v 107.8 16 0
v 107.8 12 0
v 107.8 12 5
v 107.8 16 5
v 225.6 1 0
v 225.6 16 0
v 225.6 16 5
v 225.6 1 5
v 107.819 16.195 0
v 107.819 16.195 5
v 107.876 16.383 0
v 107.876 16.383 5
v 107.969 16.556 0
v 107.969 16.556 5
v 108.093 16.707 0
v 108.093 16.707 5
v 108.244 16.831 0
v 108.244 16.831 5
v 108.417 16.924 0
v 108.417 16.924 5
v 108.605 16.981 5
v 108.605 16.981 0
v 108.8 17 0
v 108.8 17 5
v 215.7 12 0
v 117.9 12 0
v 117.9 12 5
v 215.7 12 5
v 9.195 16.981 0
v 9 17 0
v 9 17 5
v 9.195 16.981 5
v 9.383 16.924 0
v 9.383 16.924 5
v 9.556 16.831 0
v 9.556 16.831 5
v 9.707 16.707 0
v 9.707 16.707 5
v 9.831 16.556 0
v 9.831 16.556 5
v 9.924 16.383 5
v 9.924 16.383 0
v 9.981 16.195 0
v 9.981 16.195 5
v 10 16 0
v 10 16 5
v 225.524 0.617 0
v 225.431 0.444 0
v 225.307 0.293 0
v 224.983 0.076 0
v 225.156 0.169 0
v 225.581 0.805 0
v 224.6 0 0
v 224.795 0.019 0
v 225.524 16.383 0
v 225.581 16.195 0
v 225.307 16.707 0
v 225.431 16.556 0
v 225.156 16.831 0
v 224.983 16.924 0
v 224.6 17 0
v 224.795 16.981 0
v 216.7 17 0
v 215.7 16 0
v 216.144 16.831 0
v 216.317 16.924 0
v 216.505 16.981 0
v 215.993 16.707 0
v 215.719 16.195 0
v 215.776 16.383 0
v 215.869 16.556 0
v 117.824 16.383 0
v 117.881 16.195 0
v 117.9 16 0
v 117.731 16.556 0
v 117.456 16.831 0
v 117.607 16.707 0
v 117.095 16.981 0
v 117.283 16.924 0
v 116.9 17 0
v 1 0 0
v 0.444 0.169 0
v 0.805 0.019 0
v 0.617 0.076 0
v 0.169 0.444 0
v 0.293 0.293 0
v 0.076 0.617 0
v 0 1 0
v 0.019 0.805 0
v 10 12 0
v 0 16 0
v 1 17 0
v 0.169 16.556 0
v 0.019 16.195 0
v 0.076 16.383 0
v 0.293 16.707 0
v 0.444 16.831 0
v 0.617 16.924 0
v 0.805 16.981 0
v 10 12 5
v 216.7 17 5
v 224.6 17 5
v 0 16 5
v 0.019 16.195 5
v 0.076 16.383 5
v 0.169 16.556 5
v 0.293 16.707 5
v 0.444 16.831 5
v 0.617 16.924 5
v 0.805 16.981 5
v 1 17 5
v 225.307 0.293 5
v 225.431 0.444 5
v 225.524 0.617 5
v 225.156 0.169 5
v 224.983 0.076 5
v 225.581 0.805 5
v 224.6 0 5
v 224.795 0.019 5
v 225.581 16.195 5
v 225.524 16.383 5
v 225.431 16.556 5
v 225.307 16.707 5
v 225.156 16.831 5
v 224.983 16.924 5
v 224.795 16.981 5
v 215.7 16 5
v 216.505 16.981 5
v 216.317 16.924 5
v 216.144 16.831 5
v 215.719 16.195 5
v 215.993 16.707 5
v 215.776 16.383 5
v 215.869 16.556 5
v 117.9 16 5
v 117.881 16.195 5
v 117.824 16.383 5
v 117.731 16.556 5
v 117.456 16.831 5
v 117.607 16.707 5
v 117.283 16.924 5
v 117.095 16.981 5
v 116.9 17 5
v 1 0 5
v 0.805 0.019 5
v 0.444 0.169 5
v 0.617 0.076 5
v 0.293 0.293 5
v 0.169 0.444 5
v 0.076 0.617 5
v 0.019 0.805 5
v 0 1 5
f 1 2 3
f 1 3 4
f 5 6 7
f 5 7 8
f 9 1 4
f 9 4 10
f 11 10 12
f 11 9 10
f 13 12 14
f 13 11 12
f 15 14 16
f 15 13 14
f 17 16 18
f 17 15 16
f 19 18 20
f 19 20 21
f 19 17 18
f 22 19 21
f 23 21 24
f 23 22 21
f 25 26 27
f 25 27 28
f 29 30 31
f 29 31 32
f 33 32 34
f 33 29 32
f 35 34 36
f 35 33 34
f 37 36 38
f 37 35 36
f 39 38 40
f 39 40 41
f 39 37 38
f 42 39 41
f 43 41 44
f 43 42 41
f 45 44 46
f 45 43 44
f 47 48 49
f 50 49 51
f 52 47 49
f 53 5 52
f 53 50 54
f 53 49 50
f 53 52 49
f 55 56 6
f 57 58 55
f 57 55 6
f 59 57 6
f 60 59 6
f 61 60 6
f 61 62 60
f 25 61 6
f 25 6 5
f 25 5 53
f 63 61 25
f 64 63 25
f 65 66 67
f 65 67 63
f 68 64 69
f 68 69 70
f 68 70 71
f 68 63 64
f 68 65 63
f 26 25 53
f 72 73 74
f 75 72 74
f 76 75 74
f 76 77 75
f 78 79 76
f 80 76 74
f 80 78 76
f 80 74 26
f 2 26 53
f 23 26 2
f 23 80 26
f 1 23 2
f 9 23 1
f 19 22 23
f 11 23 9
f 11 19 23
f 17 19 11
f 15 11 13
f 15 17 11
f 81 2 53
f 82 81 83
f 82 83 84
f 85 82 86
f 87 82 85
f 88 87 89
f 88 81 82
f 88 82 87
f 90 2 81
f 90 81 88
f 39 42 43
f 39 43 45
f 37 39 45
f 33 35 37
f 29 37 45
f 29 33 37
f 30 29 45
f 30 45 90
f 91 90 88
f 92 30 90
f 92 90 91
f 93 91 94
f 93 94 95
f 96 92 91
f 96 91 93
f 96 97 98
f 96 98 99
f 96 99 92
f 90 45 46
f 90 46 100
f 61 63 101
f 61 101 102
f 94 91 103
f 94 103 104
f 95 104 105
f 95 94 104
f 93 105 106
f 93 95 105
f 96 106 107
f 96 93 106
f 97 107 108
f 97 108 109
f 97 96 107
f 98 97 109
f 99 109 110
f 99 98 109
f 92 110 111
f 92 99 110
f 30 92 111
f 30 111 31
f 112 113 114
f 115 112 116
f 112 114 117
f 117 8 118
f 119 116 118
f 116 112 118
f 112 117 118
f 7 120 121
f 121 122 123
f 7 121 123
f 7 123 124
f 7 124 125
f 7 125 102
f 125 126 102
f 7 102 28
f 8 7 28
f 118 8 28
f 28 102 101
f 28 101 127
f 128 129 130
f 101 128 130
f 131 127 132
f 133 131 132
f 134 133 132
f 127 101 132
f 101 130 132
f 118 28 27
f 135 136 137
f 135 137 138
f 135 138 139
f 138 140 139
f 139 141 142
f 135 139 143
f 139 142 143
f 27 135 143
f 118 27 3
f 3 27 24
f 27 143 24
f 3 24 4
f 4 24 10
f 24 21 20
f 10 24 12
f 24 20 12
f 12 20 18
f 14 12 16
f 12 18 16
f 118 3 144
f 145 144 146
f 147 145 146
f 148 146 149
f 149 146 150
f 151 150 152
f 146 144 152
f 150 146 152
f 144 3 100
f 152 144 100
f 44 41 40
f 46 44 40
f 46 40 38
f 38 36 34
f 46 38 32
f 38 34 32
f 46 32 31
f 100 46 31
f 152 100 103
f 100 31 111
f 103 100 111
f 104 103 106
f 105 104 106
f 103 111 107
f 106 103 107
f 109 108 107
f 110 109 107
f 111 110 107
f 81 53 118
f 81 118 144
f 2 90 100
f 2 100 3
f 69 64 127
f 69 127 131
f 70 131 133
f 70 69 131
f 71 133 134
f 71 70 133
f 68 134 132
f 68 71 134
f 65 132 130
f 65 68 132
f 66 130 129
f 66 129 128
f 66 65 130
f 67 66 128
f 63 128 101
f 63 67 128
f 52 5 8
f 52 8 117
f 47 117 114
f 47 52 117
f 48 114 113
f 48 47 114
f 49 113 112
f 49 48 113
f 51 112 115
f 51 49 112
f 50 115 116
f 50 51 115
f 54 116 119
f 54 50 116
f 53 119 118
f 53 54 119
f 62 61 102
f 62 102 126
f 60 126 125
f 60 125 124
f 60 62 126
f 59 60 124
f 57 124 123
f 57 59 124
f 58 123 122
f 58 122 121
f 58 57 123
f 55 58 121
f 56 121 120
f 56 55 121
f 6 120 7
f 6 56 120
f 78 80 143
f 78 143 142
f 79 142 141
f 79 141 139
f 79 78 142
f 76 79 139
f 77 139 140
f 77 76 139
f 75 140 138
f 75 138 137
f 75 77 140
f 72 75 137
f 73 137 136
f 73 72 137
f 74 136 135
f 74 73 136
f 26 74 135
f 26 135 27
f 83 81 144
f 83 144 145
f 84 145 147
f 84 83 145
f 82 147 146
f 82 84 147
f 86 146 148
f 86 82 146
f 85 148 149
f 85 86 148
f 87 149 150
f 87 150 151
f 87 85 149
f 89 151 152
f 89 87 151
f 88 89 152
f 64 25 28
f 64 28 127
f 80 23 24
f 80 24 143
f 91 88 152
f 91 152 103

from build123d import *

# Parameters (mm, degrees)
BOSS_EXTRUDE1_DEPTH = 5


with BuildPart() as part:
    # Sketch1 → Boss-Extrude1 (new body)
    with BuildSketch(Plane.XY):
        with BuildLine():
            Line((117.9, 12), (215.7, 12))
            Line((215.7, 12), (215.7, 16))
            ThreePointArc((215.7, 16), (215.992893219, 16.707106781), (216.7, 17))
            Line((216.7, 17), (224.6, 17))
            ThreePointArc((224.6, 17), (225.307106781, 16.707106781), (225.6, 16))
            Line((225.6, 16), (225.6, 1))
            ThreePointArc((225.6, 1), (225.307106781, 0.292893219), (224.6, 0))
            Line((224.6, 0), (1, 0))
            ThreePointArc((1, 0), (0.292893219, 0.292893219), (0, 1))
            Line((0, 1), (0, 16))
            ThreePointArc((0, 16), (0.292893219, 16.707106781), (1, 17))
            Line((1, 17), (9, 17))
            ThreePointArc((9, 17), (9.707106781, 16.707106781), (10, 16))
            Line((10, 16), (10, 12))
            Line((10, 12), (107.8, 12))
            Line((107.8, 12), (107.8, 16))
            ThreePointArc((107.8, 16), (108.092893219, 16.707106781), (108.8, 17))
            Line((108.8, 17), (116.9, 17))
            ThreePointArc((116.9, 17), (117.607106781, 16.707106781), (117.9, 16))
            Line((117.9, 16), (117.9, 12))
        make_face()
    extrude(amount=BOSS_EXTRUDE1_DEPTH)


solid = part.part
